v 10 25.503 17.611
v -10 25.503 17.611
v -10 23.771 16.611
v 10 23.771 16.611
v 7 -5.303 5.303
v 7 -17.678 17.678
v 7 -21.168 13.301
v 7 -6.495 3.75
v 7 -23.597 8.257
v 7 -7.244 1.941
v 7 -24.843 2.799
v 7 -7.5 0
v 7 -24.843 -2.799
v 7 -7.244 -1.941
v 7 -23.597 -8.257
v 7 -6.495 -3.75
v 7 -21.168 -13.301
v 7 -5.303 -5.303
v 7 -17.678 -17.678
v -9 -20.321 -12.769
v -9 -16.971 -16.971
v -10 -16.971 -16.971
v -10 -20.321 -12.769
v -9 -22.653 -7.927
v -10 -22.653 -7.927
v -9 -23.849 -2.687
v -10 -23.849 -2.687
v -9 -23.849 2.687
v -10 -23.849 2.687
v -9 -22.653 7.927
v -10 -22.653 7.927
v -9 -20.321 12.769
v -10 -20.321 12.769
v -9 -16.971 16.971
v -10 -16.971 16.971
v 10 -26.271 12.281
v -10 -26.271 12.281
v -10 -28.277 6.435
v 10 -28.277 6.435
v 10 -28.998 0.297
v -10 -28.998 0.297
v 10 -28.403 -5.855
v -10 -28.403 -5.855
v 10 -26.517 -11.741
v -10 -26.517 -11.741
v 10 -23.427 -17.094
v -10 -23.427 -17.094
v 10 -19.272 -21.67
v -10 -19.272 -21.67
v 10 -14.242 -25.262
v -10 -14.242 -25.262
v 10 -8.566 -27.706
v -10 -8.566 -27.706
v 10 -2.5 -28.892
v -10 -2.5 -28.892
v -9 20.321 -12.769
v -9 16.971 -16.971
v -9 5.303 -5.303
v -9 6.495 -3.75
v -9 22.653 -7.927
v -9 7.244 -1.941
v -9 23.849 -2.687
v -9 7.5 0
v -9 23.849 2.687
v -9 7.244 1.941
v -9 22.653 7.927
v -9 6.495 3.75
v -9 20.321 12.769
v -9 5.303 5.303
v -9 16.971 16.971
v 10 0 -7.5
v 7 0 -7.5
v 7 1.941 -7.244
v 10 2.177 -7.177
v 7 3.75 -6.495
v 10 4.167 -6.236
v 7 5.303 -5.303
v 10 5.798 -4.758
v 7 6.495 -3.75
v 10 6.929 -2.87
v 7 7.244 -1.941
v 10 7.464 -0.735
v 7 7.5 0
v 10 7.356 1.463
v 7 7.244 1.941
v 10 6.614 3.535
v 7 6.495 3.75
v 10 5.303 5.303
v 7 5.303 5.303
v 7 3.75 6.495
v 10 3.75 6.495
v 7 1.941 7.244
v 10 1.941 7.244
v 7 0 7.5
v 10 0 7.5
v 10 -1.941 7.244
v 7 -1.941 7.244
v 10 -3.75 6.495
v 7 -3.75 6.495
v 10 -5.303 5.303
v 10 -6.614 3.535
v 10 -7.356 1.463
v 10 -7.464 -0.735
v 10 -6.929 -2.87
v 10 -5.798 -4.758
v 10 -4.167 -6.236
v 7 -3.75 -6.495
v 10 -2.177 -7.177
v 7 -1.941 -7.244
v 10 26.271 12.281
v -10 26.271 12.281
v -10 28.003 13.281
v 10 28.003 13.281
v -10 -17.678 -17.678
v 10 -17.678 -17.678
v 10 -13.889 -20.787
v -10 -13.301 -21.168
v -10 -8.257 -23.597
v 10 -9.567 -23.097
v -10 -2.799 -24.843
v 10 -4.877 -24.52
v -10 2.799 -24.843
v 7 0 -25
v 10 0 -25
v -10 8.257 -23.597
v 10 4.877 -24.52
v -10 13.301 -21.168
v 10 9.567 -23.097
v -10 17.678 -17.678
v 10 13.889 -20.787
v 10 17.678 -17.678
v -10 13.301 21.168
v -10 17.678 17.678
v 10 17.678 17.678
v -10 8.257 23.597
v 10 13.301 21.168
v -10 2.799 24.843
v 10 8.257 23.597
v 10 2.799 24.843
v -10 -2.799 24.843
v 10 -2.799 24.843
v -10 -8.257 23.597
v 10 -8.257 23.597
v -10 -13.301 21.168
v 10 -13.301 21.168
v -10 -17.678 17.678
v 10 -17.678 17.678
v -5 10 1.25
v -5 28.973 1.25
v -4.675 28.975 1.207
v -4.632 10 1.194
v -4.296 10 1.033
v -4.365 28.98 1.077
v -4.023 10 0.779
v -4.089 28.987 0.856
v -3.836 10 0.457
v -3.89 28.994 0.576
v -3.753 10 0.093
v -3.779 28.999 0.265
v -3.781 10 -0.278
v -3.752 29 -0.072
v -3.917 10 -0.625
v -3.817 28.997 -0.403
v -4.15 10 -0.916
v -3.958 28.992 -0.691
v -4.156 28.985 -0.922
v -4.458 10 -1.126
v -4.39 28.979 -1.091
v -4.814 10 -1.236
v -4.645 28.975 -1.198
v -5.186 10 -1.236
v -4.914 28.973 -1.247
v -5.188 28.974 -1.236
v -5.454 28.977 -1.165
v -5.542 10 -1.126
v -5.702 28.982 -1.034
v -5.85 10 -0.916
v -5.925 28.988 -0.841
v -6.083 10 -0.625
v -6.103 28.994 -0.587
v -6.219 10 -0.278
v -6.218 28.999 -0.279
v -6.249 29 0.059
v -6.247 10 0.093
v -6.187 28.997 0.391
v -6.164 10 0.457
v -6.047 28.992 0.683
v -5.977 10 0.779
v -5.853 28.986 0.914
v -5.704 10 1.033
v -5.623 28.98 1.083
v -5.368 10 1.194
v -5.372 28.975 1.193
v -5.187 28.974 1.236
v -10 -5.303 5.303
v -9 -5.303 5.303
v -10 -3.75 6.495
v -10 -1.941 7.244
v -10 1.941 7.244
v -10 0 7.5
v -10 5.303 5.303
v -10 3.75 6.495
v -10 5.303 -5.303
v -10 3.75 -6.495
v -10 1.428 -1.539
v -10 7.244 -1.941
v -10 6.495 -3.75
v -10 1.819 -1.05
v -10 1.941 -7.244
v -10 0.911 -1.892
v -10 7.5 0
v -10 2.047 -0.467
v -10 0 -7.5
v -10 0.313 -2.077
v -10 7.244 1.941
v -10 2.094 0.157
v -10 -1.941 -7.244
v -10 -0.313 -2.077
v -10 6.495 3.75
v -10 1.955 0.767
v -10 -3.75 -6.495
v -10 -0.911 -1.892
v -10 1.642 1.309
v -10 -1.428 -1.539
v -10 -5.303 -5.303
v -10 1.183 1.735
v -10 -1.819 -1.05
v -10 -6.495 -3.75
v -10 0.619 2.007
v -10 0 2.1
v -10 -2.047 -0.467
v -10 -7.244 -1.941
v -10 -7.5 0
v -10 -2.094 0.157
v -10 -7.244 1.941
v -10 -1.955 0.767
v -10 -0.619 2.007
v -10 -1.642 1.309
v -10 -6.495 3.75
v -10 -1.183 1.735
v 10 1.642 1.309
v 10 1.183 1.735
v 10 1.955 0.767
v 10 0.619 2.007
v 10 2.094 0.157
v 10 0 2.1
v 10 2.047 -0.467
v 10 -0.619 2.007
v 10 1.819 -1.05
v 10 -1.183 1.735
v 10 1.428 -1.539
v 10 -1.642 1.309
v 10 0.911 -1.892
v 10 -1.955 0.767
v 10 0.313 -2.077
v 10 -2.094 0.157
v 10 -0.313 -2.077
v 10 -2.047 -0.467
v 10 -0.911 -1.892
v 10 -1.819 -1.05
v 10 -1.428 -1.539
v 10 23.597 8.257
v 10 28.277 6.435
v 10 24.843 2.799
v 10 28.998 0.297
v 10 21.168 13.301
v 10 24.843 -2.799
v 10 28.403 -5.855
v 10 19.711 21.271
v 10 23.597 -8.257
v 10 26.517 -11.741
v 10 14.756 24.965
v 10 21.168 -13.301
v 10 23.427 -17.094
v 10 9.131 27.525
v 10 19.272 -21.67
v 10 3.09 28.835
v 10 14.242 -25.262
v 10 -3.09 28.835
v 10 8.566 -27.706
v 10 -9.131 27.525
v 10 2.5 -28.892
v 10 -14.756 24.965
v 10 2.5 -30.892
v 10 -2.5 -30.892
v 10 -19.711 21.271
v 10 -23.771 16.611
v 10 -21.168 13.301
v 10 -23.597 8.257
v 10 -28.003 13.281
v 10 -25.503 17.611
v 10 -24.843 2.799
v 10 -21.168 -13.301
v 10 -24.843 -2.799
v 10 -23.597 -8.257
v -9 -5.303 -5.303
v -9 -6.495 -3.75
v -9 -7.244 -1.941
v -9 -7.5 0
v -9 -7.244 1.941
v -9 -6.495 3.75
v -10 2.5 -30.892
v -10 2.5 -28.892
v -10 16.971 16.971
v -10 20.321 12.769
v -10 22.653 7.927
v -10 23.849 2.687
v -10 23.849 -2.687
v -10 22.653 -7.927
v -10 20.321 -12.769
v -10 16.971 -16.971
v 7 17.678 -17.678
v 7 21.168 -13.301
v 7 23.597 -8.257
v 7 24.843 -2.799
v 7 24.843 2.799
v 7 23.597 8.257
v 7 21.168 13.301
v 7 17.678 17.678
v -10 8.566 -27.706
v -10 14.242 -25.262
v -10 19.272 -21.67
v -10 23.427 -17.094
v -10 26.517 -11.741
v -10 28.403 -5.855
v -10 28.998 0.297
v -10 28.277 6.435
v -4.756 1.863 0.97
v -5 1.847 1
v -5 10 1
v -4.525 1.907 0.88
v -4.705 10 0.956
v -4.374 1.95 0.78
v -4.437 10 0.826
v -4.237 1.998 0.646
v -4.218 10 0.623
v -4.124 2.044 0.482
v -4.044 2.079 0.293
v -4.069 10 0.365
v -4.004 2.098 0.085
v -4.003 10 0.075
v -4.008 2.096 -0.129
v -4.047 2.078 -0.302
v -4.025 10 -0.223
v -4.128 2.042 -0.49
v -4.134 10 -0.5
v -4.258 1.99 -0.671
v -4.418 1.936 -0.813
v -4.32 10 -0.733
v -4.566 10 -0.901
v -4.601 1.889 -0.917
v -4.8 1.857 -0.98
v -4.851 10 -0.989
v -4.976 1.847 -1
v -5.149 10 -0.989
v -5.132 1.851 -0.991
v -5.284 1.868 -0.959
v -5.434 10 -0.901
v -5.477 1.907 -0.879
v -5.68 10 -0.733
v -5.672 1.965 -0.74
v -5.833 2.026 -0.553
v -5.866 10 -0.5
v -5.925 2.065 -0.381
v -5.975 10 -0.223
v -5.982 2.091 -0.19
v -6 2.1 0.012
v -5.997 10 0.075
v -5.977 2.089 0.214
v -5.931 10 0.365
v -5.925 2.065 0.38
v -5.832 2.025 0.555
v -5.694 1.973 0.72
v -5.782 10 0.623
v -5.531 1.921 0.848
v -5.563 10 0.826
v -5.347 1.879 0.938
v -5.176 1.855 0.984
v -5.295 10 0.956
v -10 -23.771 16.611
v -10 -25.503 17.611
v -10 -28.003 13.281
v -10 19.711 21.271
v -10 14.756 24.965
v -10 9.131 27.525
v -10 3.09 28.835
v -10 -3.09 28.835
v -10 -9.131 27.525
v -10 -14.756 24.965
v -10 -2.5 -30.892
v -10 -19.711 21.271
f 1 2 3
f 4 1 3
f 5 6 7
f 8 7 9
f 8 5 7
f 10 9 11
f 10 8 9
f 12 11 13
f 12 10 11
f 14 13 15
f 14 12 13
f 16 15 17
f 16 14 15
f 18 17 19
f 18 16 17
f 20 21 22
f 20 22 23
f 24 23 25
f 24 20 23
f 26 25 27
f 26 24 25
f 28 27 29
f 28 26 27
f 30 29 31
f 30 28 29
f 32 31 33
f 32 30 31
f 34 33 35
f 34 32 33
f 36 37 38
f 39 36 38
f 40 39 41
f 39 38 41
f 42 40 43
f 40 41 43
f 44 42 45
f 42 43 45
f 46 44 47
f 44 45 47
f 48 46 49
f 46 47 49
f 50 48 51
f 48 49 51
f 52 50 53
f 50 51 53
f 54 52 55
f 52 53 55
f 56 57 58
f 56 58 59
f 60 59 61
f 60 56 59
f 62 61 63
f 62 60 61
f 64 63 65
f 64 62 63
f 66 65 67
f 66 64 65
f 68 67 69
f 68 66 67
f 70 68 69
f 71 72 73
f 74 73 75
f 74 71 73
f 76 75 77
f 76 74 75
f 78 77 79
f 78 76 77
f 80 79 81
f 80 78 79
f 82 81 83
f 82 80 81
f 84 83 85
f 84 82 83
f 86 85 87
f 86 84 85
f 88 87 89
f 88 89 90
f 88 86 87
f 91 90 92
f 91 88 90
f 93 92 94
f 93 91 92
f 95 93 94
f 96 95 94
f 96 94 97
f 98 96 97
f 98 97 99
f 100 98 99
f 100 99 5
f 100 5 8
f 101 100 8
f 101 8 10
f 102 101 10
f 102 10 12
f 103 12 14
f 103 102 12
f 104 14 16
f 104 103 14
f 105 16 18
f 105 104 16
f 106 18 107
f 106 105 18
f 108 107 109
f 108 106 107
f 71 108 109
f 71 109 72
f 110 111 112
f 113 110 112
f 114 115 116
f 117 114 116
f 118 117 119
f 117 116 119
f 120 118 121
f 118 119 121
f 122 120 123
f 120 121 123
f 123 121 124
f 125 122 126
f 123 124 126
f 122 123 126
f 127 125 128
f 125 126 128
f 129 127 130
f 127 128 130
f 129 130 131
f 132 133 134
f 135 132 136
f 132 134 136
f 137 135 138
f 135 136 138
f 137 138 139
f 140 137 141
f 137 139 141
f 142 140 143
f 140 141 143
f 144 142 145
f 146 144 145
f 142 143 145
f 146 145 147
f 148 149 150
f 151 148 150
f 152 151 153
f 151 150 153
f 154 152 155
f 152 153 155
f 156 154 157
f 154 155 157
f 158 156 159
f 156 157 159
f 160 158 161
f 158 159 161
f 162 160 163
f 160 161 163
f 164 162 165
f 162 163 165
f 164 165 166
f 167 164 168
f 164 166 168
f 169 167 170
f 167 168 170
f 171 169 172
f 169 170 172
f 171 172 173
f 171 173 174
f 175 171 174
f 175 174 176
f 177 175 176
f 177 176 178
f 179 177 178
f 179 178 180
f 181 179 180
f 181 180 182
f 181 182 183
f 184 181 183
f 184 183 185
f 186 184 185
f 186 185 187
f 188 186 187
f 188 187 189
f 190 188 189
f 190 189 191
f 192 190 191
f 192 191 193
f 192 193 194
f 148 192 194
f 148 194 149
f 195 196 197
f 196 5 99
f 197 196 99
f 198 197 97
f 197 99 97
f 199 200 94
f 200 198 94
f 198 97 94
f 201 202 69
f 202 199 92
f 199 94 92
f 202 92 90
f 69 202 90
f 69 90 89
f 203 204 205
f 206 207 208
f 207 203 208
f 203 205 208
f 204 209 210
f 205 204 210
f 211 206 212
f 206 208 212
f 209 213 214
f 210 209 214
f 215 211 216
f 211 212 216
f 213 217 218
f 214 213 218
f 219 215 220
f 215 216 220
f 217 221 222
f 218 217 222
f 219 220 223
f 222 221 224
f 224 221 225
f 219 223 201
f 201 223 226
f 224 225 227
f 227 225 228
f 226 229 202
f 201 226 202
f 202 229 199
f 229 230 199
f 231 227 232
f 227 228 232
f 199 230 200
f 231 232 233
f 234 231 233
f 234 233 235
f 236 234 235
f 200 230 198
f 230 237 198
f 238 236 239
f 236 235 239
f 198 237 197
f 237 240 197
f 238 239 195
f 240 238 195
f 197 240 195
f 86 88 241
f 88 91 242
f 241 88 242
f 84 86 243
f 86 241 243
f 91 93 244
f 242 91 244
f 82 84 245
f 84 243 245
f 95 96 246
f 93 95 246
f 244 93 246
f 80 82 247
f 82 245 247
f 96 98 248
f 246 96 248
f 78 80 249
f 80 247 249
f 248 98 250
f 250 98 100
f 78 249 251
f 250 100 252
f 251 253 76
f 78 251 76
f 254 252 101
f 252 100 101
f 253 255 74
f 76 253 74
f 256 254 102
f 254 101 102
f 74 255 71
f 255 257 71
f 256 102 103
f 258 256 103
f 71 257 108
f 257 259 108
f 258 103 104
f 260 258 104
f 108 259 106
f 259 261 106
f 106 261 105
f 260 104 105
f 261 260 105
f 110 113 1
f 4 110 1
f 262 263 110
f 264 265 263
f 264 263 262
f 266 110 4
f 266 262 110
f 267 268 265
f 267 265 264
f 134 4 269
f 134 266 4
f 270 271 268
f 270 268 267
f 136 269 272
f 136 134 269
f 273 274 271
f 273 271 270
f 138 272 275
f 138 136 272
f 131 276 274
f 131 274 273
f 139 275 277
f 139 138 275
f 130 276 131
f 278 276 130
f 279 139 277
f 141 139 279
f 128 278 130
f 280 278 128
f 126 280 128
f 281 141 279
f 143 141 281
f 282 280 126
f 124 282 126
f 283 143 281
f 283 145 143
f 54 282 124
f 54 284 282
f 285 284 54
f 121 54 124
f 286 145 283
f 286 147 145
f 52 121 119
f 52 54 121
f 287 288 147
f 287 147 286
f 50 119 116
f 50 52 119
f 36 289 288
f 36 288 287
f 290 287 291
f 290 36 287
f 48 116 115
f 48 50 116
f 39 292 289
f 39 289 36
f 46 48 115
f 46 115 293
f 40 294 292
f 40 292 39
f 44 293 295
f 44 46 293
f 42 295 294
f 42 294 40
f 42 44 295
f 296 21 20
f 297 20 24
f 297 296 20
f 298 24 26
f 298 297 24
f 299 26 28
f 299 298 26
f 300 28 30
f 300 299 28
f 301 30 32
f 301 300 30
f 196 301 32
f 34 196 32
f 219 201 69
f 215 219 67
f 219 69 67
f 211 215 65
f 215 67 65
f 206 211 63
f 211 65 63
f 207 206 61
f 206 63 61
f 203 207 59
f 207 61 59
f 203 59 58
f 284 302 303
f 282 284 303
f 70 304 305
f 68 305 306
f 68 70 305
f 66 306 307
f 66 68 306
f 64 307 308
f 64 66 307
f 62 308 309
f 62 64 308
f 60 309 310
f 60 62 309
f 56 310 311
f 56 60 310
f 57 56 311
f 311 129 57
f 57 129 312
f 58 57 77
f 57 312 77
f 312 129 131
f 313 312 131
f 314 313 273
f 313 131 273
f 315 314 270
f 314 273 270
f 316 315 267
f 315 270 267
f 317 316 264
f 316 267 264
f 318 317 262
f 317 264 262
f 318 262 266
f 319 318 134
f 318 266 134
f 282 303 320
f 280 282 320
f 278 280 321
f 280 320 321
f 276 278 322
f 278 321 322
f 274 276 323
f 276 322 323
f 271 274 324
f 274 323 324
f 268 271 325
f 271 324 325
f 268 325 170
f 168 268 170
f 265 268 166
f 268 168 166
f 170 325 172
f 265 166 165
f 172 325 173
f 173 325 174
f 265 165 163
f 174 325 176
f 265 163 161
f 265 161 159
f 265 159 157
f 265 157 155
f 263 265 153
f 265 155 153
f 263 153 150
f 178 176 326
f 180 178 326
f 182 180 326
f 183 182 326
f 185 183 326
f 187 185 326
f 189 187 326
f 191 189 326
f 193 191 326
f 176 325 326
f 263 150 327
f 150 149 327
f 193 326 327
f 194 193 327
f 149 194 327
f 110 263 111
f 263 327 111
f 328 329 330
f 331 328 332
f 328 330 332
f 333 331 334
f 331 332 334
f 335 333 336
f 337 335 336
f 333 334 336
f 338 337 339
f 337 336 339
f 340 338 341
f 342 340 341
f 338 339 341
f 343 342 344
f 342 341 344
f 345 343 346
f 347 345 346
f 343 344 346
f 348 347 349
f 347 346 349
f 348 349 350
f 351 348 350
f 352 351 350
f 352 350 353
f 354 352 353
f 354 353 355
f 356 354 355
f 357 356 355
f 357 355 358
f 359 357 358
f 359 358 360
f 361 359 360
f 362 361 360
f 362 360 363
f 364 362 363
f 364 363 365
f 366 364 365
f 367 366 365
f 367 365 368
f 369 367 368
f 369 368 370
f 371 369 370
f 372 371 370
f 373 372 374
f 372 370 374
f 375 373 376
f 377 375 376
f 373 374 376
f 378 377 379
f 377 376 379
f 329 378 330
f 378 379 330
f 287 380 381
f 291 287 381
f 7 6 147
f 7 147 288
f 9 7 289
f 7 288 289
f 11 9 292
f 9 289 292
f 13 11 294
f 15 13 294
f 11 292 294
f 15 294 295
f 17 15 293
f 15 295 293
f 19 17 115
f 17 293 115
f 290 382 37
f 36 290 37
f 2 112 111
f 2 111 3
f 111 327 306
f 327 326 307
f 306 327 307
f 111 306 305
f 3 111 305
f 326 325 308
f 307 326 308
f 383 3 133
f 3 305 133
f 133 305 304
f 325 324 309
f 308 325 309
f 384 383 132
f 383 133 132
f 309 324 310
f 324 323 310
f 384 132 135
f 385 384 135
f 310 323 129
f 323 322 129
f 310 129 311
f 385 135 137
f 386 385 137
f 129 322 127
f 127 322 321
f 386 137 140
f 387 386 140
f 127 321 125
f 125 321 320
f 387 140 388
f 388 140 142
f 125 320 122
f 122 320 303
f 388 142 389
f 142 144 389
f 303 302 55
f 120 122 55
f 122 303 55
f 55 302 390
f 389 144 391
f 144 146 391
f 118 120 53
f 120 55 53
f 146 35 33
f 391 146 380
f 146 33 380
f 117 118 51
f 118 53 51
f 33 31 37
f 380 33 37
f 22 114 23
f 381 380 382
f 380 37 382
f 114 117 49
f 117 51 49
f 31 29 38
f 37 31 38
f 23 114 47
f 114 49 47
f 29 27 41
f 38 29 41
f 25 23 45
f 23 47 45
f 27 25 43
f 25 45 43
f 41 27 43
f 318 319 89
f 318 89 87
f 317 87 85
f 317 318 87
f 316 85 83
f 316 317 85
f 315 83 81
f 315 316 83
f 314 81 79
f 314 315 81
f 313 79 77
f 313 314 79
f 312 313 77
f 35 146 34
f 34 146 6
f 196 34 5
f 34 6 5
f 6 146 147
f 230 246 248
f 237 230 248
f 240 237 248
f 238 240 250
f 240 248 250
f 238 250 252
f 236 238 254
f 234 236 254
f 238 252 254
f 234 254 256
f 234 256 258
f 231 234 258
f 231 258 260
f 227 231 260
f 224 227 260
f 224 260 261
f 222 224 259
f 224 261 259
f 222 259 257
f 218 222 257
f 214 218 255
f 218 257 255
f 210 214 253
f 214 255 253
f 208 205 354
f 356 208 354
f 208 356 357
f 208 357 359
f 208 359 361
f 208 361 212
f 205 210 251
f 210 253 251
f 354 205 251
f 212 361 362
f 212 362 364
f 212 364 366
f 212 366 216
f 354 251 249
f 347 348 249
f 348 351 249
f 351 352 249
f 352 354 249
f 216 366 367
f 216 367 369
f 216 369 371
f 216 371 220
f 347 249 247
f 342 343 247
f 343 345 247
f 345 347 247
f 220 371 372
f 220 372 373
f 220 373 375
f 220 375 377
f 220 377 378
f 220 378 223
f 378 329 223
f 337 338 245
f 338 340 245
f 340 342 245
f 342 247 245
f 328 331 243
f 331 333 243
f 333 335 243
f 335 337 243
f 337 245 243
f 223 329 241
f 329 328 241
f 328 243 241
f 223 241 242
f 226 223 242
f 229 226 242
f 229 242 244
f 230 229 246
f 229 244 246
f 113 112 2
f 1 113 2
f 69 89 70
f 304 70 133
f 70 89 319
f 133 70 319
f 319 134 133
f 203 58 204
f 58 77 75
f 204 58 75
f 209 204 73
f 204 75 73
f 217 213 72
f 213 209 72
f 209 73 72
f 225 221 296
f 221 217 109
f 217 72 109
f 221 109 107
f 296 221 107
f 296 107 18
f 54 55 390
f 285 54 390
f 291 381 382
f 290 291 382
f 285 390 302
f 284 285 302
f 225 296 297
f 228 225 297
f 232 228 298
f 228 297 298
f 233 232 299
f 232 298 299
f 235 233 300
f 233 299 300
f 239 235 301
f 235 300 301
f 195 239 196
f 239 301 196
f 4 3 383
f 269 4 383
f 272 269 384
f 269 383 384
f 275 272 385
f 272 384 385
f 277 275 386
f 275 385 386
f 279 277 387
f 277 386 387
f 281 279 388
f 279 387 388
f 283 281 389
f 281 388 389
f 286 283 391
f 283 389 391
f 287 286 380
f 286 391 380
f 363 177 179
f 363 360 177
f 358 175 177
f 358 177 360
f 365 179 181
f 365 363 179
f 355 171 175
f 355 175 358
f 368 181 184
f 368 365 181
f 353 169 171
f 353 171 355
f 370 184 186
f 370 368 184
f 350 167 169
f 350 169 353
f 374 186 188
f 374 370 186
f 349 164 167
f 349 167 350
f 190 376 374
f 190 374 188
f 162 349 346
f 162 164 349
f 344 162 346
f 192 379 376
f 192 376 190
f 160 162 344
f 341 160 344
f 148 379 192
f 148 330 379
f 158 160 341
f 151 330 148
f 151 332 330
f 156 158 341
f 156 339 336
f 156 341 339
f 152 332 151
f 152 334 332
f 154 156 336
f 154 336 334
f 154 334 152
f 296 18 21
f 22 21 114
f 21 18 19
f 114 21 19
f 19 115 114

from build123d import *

# Parameters (mm, degrees)
CROQUIS2_R              = 25
CROQUIS2_R_2            = 7.5
CORTAR_EXTRUIR1_DEPTH   = 3
CORTAR_EXTRUIR3_DEPTH   = 73
CROQUIS4_R              = 1.25
CORTAR_EXTRUIR4_DEPTH   = 20
CROQUIS5_R              = 1
CORTAR_EXTRUIR5_DEPTH   = 10
CORTAR_EXTRUIR6_START   = -1
CROQUIS6_R              = 24
CROQUIS6_R_2            = 7.5
CORTAR_EXTRUIR6_DEPTH   = 1
SALIENTE_EXTRUIR1_START = -20
SALIENTE_EXTRUIR1_DEPTH = 20
MATRIZC1_COUNT          = 3


with BuildPart() as part:
    # Croquis1 → Revolución1 (revolve)
    with BuildSketch(Plane.XY, mode=Mode.PRIVATE) as revoluci_n1_sk:
        Polygon((-10, 29), (-10, 2.1), (0, 2.1), (10, 2.1), (10, 29), align=None)
    revolve(revoluci_n1_sk.sketch.rotate(Axis((0, 0, 0), (1, 0, 0)), 90), axis=Axis((0, 0, 0), (1, 0, 0)))

    # Croquis2 → Cortar-Extruir1 (cut)
    with BuildSketch(Plane(origin=(10, 0, 0), x_dir=(0, 0, -1), z_dir=(1, 0, 0))):
        Circle(CROQUIS2_R)
        Circle(CROQUIS2_R_2, mode=Mode.SUBTRACT)
    extrude(amount=-CORTAR_EXTRUIR1_DEPTH, mode=Mode.SUBTRACT)

    # Croquis3 → Cortar-Extruir3 (cut)
    with BuildSketch(Plane(origin=(10, 0, 0), x_dir=(0, 0, -1), z_dir=(1, 0, 0))):
        with BuildLine():
            ThreePointArc((-5.303301, -5.303301), (-7.5, 0), (-5.303301, 5.303301))
            Line((-5.303301, 5.303301), (-17.67767, 17.67767))
            ThreePointArc((-17.67767, 17.67767), (-25, 0), (-17.67767, -17.67767))
            Line((-17.67767, -17.67767), (-5.303301, -5.303301))
        make_face()
        with BuildLine():
            ThreePointArc((17.67767, -17.67767), (25, 0), (17.67767, 17.67767))
            Line((17.67767, 17.67767), (5.303301, 5.303301))
            ThreePointArc((5.303301, 5.303301), (7.5, 0), (5.303301, -5.303301))
            Line((5.303301, -5.303301), (17.67767, -17.67767))
        make_face()
    extrude(amount=-CORTAR_EXTRUIR3_DEPTH, mode=Mode.SUBTRACT)

    # Croquis4 → Cortar-Extruir4 (cut)
    with BuildSketch(Plane(origin=(0, 30, 0), x_dir=(1, 0, 0), z_dir=(0, 1, 0))):
        with Locations(Location((-5, 0, 0), (0, 0, 270))):
            Circle(CROQUIS4_R)
    extrude(amount=-CORTAR_EXTRUIR4_DEPTH, mode=Mode.SUBTRACT)

    # Croquis5 → Cortar-Extruir5 (cut)
    with BuildSketch(Plane(origin=(0, 10, 0), x_dir=(1, 0, 0), z_dir=(0, 1, 0))):
        with Locations(Location((-5, 0, 0), (0, 0, 270))):
            Circle(CROQUIS5_R)
    extrude(amount=-CORTAR_EXTRUIR5_DEPTH, mode=Mode.SUBTRACT)

    # Croquis6 → Cortar-Extruir6 (cut)
    with BuildSketch(Plane.ZY.offset(10).offset(CORTAR_EXTRUIR6_START)):
        Circle(CROQUIS6_R)
        with Locations(Location((0, 0, 0), (0, 0, 180))):
            Circle(CROQUIS6_R_2, mode=Mode.SUBTRACT)
    extrude(amount=CORTAR_EXTRUIR6_DEPTH, mode=Mode.SUBTRACT)

    # Croquis7 → Saliente-Extruir1 (add)
    with BuildSketch(Plane(origin=(10, 0, 0), x_dir=(0, 0, -1), z_dir=(1, 0, 0)).offset(SALIENTE_EXTRUIR1_START)):
        with BuildLine():
            Line((29, -2.5), (29, 0))
            ThreePointArc((29, 0), (28.972998, -1.251165), (28.89204, -2.5))
            Line((28.89204, -2.5), (29, -2.5))
        make_face()
        Polygon((30.89204, 2.5), (29, 2.5), (29, 0), (29, -2.5), (30.89204, -2.5), align=None)
        with BuildLine():
            Line((29, 0), (29, 2.5))
            Line((29, 2.5), (28.89204, 2.5))
            ThreePointArc((28.89204, 2.5), (28.972998, 1.251165), (29, 0))
        make_face()
    saliente_extruir1 = extrude(amount=SALIENTE_EXTRUIR1_DEPTH)

    # MatrizC1: Saliente-Extruir1 ×3 about axis
    matrizc1_axis = Axis((0, 0, 0), (1, 0, 0))
    for i in range(1, MATRIZC1_COUNT):
        add(saliente_extruir1.rotate(matrizc1_axis, i * 360 / MATRIZC1_COUNT))


solid = part.part
